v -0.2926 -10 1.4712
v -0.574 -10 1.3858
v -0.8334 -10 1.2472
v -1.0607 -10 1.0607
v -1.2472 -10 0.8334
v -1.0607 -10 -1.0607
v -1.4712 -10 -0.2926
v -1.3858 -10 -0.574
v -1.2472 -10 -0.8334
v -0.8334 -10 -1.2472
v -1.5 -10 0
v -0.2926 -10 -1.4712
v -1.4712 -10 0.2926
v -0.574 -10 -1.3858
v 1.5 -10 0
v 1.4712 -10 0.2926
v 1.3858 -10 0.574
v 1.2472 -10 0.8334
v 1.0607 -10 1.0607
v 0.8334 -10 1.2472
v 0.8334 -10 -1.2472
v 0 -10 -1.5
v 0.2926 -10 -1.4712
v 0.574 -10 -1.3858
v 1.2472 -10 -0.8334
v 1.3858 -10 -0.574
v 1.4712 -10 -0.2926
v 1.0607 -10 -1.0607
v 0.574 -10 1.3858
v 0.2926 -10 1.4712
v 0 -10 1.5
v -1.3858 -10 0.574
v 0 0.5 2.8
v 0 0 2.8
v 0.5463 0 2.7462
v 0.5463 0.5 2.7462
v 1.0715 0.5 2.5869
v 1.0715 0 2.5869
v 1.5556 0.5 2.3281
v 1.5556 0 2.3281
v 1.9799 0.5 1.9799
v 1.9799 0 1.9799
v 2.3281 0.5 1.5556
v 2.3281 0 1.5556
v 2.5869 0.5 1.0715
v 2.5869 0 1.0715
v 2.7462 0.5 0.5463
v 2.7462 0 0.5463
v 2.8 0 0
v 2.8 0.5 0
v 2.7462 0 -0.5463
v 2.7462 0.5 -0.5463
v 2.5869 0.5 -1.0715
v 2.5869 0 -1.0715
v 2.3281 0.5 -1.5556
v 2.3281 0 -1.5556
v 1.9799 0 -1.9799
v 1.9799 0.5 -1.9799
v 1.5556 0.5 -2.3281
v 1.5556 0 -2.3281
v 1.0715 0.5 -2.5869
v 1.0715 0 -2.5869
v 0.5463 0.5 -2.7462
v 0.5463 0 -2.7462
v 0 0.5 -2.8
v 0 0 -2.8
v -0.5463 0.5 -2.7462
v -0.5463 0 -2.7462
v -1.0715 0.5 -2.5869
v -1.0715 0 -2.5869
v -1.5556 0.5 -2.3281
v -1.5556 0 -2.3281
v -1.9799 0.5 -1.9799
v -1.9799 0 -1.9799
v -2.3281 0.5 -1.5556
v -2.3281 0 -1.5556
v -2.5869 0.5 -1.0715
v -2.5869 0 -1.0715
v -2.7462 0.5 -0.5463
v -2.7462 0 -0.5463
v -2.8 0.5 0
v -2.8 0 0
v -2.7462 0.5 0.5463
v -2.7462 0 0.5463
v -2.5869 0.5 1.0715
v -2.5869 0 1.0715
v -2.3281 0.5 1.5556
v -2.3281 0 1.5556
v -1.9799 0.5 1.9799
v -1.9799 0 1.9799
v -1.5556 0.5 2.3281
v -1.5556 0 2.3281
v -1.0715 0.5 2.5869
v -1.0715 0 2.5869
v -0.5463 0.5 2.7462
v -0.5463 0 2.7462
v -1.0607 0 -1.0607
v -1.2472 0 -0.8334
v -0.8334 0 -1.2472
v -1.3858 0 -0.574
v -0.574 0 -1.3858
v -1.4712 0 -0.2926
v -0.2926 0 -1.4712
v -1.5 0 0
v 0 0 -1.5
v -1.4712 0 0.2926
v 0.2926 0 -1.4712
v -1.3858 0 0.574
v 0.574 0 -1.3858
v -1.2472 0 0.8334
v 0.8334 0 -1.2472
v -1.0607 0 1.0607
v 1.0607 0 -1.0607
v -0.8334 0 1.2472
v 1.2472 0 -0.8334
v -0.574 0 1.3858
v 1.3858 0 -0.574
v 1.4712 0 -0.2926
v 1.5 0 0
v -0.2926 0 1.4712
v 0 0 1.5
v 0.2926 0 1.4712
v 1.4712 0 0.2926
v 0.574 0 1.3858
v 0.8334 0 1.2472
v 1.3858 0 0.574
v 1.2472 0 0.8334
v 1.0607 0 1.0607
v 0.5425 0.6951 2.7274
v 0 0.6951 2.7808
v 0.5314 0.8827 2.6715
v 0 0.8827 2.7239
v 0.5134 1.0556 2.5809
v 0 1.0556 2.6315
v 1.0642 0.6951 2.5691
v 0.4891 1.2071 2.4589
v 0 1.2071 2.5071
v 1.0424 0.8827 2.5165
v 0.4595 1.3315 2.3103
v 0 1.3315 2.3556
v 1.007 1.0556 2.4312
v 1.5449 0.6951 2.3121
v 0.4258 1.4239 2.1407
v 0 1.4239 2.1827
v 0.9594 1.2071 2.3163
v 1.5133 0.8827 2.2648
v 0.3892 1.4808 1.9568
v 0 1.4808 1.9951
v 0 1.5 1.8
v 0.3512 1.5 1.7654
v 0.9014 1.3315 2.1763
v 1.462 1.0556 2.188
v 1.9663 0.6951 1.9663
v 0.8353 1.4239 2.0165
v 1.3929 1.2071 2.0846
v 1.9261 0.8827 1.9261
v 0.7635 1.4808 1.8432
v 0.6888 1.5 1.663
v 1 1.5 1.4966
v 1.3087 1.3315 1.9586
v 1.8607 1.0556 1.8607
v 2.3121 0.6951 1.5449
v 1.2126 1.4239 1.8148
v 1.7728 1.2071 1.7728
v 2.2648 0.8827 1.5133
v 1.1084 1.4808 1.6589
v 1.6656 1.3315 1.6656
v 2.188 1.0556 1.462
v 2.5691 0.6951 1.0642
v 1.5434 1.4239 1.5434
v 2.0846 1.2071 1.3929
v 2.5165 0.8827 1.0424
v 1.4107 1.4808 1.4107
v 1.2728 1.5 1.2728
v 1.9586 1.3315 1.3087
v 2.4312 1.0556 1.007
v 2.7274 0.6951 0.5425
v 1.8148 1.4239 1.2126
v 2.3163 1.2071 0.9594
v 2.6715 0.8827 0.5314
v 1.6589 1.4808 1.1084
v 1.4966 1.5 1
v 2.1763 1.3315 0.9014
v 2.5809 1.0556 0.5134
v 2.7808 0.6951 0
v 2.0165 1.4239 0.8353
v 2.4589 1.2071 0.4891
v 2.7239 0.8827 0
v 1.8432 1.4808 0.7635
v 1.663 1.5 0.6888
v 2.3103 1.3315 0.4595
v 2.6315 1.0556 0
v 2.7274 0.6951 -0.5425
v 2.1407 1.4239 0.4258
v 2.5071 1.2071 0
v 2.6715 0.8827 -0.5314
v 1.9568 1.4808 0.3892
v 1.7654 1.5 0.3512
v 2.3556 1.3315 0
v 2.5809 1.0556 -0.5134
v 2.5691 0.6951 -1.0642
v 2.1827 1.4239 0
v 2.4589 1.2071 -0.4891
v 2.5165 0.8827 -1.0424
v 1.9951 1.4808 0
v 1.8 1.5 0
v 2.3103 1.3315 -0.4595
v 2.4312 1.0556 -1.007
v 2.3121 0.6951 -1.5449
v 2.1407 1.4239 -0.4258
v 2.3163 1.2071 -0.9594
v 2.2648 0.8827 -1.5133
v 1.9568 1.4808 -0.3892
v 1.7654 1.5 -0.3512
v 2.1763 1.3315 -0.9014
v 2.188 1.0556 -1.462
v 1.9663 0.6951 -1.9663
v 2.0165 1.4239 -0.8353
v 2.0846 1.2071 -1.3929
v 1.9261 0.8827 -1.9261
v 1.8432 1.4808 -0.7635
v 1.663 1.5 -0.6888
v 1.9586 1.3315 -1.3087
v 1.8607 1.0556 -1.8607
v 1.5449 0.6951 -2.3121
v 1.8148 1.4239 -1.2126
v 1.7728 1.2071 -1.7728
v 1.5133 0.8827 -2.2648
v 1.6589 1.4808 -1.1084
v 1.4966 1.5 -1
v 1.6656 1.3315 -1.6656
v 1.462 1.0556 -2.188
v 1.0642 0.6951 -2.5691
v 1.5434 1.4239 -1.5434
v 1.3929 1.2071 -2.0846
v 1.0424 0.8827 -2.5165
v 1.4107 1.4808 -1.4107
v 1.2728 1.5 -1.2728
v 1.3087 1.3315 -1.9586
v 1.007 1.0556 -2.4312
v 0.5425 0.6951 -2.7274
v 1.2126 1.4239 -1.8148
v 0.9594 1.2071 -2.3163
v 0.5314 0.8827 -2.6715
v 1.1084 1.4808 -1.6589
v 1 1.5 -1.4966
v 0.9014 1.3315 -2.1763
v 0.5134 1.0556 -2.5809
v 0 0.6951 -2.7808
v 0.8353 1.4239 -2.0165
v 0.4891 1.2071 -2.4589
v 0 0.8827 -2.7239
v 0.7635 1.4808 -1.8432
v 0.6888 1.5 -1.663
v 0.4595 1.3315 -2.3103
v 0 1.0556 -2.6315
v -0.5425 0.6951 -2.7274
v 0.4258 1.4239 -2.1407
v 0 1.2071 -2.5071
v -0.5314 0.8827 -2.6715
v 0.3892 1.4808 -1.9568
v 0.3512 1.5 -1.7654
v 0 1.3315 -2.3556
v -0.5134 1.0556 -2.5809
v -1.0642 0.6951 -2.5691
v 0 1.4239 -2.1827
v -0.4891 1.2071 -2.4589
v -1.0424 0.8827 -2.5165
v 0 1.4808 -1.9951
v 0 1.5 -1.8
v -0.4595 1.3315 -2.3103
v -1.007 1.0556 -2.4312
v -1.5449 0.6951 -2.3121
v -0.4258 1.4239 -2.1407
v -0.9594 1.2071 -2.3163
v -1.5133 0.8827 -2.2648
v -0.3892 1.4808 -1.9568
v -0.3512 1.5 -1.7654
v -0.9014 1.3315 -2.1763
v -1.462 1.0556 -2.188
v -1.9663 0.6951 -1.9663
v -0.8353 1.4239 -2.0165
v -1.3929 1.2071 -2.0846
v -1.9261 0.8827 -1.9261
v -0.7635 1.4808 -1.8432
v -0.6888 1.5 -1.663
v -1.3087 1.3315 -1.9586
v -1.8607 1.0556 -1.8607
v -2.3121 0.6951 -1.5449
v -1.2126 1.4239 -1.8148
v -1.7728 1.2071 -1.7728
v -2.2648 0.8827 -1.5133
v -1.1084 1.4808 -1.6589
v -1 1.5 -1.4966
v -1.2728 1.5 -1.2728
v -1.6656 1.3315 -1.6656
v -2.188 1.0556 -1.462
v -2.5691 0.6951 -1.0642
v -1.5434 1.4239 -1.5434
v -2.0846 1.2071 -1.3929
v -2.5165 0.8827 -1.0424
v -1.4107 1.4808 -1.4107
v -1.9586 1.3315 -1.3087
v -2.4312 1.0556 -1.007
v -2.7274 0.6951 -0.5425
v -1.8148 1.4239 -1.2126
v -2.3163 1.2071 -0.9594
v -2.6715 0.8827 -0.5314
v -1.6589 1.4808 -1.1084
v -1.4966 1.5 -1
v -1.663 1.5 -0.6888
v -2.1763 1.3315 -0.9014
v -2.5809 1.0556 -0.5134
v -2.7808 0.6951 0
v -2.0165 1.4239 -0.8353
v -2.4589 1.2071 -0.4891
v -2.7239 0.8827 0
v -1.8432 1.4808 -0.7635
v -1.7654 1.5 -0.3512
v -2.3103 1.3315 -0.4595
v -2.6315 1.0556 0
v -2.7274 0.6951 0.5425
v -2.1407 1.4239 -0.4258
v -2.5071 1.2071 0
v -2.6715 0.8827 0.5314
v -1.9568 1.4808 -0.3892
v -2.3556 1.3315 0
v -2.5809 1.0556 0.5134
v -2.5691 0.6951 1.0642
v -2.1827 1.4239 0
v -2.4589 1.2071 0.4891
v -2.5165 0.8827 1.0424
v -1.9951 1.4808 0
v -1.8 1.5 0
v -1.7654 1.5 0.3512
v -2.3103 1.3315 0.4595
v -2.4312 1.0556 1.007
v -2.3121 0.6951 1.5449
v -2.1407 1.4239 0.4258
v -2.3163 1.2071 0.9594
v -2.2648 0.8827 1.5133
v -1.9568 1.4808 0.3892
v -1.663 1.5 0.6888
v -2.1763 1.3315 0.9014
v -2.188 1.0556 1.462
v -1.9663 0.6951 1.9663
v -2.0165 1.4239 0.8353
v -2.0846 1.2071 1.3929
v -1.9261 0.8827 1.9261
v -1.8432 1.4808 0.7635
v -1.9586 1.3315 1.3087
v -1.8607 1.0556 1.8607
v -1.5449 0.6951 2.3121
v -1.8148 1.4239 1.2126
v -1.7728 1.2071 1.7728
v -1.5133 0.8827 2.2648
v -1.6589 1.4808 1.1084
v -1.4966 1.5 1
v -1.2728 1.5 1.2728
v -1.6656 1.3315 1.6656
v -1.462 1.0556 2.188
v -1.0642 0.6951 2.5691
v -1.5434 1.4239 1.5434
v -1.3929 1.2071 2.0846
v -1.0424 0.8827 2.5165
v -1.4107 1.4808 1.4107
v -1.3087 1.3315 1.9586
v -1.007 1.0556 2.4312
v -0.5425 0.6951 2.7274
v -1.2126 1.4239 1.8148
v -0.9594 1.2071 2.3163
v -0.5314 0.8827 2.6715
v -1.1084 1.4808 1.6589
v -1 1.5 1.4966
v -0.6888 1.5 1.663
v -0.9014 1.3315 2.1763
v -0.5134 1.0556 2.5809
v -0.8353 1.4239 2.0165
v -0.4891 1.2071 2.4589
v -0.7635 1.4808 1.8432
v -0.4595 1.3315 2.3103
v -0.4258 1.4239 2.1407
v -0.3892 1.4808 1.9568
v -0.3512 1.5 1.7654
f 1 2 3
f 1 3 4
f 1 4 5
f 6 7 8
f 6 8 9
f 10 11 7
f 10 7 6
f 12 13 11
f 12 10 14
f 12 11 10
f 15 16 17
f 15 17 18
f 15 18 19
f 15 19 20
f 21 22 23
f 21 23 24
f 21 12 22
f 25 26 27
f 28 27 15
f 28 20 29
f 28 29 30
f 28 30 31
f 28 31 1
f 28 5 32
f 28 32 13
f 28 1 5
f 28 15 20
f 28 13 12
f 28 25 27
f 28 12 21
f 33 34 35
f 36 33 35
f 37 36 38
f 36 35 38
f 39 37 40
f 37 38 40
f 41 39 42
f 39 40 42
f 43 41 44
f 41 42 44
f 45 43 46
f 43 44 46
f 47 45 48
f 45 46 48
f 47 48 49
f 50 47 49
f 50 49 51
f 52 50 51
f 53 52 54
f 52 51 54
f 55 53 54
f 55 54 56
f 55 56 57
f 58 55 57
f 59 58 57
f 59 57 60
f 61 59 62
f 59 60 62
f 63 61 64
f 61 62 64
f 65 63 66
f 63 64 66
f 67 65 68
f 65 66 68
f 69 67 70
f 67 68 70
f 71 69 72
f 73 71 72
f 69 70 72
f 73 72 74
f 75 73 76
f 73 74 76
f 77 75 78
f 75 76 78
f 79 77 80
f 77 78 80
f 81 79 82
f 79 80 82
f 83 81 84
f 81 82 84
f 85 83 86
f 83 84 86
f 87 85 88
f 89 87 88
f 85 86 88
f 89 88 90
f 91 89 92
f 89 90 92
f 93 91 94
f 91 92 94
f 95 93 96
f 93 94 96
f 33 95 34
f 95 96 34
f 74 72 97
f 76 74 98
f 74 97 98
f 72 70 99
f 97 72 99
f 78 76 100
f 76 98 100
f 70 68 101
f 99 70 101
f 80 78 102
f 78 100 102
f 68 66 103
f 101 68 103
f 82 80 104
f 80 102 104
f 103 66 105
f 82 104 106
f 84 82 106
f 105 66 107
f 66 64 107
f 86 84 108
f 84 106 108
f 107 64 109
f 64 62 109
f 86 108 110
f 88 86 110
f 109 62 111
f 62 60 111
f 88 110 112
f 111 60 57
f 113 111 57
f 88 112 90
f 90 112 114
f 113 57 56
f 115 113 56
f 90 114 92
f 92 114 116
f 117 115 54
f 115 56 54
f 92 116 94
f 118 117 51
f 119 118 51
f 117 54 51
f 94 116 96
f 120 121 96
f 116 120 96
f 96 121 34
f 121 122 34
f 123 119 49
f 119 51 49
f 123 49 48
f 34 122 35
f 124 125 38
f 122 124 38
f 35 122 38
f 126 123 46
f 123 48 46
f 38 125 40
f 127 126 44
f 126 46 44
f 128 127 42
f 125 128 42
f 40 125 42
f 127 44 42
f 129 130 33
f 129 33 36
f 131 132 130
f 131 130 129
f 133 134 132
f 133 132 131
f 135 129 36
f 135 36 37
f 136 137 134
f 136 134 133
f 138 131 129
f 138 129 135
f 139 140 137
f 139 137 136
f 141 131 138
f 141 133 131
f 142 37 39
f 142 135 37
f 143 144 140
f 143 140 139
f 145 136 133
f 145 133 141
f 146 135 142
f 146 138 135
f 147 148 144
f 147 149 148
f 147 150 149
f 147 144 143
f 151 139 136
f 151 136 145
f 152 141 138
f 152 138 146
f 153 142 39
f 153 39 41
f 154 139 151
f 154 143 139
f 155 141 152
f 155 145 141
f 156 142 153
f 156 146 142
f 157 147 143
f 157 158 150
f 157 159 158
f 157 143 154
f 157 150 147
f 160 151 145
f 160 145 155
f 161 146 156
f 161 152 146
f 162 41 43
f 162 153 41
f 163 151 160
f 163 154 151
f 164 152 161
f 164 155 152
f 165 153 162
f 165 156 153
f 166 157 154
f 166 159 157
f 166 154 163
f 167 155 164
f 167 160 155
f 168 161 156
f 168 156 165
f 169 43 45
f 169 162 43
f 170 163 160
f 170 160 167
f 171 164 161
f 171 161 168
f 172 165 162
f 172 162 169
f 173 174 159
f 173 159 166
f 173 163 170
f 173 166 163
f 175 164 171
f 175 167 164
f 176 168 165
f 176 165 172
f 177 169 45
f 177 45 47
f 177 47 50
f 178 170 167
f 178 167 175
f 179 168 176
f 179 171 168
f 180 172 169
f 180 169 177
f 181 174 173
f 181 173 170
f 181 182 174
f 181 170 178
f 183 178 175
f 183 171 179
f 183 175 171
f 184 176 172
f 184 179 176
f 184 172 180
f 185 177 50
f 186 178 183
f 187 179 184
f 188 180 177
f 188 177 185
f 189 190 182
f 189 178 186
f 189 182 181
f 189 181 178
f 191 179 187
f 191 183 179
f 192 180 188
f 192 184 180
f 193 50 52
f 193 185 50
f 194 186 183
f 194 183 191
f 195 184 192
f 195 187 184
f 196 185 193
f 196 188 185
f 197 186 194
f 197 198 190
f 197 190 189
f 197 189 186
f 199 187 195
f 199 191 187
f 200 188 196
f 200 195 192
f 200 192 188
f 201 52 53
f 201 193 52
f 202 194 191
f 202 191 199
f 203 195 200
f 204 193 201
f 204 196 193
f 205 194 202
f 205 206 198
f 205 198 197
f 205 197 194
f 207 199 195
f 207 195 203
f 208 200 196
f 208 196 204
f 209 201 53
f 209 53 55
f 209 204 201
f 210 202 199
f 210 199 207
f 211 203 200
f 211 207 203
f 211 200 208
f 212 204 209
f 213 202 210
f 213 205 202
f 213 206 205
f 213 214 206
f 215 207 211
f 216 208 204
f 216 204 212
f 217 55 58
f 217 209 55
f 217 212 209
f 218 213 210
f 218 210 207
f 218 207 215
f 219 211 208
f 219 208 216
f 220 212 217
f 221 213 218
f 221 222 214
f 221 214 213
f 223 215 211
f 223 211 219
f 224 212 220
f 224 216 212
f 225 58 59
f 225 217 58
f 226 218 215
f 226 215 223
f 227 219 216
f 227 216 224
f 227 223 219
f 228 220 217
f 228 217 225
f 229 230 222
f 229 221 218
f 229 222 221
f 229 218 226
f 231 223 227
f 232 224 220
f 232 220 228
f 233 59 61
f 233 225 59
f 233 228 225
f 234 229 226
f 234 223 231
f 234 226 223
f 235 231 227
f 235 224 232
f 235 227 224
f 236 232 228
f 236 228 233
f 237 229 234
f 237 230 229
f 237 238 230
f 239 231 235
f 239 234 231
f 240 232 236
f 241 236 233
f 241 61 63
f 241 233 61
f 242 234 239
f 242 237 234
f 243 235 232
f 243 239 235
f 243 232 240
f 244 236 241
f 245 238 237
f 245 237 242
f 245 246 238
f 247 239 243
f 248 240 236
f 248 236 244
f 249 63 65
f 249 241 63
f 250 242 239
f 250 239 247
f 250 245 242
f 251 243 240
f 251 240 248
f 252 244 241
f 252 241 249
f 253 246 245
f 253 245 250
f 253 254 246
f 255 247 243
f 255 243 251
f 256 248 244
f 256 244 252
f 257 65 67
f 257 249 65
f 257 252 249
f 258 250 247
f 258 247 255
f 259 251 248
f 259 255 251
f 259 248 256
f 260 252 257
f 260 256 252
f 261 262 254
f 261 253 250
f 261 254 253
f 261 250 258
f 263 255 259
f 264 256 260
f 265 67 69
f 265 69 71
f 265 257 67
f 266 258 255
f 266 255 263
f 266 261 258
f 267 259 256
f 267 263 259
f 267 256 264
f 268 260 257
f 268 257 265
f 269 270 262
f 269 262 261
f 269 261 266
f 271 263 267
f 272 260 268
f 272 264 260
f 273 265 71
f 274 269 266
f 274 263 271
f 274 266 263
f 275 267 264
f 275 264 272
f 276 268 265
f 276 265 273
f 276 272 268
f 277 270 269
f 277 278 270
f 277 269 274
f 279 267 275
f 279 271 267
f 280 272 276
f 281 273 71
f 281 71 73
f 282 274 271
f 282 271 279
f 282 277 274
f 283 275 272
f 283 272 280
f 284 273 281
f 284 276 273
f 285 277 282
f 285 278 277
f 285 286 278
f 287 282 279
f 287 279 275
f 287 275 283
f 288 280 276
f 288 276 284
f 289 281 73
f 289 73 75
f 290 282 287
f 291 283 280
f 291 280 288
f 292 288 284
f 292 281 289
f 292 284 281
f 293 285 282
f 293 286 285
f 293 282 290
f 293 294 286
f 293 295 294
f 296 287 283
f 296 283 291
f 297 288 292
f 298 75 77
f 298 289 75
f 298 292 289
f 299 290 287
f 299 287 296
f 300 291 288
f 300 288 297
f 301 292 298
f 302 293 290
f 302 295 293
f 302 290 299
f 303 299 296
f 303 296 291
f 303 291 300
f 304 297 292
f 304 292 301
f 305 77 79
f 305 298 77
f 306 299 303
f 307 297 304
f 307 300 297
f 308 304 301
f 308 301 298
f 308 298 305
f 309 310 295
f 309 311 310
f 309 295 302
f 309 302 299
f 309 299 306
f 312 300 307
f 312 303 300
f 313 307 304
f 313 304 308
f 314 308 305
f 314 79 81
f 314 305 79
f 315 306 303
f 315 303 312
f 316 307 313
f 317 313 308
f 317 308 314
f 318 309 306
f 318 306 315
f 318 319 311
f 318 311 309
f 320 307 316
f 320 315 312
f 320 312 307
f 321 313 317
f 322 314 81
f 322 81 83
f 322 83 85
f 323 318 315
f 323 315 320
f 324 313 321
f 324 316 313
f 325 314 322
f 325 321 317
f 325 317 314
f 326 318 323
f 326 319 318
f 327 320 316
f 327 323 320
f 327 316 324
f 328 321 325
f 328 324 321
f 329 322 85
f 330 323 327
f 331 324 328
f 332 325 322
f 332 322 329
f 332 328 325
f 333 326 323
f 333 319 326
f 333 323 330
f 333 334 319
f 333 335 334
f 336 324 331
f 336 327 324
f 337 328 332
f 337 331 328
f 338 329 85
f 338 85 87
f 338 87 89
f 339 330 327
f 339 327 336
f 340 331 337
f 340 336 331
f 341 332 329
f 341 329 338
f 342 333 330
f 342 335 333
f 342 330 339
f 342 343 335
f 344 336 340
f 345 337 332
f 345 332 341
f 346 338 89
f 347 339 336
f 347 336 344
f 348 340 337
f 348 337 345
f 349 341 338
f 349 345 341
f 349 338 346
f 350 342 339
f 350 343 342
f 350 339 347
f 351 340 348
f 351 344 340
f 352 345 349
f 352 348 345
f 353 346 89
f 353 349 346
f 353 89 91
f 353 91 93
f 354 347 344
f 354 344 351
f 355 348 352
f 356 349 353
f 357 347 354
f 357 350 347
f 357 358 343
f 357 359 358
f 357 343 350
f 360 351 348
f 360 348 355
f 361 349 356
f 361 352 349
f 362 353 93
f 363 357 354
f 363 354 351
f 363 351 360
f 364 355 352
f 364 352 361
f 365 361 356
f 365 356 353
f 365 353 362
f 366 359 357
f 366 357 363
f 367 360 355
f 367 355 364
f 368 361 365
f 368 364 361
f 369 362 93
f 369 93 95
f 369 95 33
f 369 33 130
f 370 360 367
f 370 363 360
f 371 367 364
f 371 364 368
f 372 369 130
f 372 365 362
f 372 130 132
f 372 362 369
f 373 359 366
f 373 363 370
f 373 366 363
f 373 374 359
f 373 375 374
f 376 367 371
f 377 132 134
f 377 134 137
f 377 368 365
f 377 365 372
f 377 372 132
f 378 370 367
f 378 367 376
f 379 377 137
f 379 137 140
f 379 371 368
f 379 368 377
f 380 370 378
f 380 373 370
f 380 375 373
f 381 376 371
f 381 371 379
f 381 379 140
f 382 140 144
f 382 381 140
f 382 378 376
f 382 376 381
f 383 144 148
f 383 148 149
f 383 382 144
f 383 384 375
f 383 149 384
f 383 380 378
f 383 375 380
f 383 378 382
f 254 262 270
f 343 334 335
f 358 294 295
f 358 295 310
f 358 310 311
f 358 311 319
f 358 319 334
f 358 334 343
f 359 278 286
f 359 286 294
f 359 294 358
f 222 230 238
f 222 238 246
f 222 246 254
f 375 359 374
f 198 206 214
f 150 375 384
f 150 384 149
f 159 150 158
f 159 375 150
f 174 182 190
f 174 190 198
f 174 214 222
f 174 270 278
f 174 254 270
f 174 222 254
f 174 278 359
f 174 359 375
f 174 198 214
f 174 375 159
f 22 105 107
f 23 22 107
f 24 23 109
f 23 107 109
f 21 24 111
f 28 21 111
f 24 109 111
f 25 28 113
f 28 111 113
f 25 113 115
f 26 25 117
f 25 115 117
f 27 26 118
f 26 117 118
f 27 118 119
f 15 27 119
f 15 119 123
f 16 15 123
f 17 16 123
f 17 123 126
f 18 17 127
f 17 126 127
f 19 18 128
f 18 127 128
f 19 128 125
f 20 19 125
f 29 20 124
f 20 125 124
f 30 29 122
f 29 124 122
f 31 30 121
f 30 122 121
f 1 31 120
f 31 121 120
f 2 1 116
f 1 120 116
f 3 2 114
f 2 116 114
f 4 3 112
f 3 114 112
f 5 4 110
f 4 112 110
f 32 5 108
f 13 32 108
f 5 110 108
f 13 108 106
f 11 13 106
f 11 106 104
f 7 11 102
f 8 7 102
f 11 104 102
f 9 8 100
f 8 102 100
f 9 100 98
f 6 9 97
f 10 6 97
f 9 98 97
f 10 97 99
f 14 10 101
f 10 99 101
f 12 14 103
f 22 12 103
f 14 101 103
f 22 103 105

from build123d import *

# Parameters (mm, degrees)
SKETCH1_R           = 2.8
BOSS_EXTRUDE1_DEPTH = 1.5
FILLET1_R           = 1
SKETCH2_R           = 1.5
BOSS_EXTRUDE2_DEPTH = 10


with BuildPart() as part:
    # Sketch1 → Boss-Extrude1 (new body)
    with BuildSketch(Plane(origin=(0, 0, 0), x_dir=(1, 0, 0), z_dir=(0, 1, 0))):
        with Locations(Location((0, 0, 0), (0, 0, 270))):
            Circle(SKETCH1_R)
    extrude(amount=BOSS_EXTRUDE1_DEPTH)

    # Fillet1
    fillet1_edges = [part.edges().sort_by_distance(p)[0] for p in [
        (0, 1.5, -2.8),
    ]]
    fillet(fillet1_edges, radius=FILLET1_R)

    # Sketch2 → Boss-Extrude2 (add)
    with BuildSketch(Plane.XZ):
        with Locations(Location((0, 0, 0), (0, 0, 270))):
            Circle(SKETCH2_R)
    extrude(amount=BOSS_EXTRUDE2_DEPTH)


solid = part.part
